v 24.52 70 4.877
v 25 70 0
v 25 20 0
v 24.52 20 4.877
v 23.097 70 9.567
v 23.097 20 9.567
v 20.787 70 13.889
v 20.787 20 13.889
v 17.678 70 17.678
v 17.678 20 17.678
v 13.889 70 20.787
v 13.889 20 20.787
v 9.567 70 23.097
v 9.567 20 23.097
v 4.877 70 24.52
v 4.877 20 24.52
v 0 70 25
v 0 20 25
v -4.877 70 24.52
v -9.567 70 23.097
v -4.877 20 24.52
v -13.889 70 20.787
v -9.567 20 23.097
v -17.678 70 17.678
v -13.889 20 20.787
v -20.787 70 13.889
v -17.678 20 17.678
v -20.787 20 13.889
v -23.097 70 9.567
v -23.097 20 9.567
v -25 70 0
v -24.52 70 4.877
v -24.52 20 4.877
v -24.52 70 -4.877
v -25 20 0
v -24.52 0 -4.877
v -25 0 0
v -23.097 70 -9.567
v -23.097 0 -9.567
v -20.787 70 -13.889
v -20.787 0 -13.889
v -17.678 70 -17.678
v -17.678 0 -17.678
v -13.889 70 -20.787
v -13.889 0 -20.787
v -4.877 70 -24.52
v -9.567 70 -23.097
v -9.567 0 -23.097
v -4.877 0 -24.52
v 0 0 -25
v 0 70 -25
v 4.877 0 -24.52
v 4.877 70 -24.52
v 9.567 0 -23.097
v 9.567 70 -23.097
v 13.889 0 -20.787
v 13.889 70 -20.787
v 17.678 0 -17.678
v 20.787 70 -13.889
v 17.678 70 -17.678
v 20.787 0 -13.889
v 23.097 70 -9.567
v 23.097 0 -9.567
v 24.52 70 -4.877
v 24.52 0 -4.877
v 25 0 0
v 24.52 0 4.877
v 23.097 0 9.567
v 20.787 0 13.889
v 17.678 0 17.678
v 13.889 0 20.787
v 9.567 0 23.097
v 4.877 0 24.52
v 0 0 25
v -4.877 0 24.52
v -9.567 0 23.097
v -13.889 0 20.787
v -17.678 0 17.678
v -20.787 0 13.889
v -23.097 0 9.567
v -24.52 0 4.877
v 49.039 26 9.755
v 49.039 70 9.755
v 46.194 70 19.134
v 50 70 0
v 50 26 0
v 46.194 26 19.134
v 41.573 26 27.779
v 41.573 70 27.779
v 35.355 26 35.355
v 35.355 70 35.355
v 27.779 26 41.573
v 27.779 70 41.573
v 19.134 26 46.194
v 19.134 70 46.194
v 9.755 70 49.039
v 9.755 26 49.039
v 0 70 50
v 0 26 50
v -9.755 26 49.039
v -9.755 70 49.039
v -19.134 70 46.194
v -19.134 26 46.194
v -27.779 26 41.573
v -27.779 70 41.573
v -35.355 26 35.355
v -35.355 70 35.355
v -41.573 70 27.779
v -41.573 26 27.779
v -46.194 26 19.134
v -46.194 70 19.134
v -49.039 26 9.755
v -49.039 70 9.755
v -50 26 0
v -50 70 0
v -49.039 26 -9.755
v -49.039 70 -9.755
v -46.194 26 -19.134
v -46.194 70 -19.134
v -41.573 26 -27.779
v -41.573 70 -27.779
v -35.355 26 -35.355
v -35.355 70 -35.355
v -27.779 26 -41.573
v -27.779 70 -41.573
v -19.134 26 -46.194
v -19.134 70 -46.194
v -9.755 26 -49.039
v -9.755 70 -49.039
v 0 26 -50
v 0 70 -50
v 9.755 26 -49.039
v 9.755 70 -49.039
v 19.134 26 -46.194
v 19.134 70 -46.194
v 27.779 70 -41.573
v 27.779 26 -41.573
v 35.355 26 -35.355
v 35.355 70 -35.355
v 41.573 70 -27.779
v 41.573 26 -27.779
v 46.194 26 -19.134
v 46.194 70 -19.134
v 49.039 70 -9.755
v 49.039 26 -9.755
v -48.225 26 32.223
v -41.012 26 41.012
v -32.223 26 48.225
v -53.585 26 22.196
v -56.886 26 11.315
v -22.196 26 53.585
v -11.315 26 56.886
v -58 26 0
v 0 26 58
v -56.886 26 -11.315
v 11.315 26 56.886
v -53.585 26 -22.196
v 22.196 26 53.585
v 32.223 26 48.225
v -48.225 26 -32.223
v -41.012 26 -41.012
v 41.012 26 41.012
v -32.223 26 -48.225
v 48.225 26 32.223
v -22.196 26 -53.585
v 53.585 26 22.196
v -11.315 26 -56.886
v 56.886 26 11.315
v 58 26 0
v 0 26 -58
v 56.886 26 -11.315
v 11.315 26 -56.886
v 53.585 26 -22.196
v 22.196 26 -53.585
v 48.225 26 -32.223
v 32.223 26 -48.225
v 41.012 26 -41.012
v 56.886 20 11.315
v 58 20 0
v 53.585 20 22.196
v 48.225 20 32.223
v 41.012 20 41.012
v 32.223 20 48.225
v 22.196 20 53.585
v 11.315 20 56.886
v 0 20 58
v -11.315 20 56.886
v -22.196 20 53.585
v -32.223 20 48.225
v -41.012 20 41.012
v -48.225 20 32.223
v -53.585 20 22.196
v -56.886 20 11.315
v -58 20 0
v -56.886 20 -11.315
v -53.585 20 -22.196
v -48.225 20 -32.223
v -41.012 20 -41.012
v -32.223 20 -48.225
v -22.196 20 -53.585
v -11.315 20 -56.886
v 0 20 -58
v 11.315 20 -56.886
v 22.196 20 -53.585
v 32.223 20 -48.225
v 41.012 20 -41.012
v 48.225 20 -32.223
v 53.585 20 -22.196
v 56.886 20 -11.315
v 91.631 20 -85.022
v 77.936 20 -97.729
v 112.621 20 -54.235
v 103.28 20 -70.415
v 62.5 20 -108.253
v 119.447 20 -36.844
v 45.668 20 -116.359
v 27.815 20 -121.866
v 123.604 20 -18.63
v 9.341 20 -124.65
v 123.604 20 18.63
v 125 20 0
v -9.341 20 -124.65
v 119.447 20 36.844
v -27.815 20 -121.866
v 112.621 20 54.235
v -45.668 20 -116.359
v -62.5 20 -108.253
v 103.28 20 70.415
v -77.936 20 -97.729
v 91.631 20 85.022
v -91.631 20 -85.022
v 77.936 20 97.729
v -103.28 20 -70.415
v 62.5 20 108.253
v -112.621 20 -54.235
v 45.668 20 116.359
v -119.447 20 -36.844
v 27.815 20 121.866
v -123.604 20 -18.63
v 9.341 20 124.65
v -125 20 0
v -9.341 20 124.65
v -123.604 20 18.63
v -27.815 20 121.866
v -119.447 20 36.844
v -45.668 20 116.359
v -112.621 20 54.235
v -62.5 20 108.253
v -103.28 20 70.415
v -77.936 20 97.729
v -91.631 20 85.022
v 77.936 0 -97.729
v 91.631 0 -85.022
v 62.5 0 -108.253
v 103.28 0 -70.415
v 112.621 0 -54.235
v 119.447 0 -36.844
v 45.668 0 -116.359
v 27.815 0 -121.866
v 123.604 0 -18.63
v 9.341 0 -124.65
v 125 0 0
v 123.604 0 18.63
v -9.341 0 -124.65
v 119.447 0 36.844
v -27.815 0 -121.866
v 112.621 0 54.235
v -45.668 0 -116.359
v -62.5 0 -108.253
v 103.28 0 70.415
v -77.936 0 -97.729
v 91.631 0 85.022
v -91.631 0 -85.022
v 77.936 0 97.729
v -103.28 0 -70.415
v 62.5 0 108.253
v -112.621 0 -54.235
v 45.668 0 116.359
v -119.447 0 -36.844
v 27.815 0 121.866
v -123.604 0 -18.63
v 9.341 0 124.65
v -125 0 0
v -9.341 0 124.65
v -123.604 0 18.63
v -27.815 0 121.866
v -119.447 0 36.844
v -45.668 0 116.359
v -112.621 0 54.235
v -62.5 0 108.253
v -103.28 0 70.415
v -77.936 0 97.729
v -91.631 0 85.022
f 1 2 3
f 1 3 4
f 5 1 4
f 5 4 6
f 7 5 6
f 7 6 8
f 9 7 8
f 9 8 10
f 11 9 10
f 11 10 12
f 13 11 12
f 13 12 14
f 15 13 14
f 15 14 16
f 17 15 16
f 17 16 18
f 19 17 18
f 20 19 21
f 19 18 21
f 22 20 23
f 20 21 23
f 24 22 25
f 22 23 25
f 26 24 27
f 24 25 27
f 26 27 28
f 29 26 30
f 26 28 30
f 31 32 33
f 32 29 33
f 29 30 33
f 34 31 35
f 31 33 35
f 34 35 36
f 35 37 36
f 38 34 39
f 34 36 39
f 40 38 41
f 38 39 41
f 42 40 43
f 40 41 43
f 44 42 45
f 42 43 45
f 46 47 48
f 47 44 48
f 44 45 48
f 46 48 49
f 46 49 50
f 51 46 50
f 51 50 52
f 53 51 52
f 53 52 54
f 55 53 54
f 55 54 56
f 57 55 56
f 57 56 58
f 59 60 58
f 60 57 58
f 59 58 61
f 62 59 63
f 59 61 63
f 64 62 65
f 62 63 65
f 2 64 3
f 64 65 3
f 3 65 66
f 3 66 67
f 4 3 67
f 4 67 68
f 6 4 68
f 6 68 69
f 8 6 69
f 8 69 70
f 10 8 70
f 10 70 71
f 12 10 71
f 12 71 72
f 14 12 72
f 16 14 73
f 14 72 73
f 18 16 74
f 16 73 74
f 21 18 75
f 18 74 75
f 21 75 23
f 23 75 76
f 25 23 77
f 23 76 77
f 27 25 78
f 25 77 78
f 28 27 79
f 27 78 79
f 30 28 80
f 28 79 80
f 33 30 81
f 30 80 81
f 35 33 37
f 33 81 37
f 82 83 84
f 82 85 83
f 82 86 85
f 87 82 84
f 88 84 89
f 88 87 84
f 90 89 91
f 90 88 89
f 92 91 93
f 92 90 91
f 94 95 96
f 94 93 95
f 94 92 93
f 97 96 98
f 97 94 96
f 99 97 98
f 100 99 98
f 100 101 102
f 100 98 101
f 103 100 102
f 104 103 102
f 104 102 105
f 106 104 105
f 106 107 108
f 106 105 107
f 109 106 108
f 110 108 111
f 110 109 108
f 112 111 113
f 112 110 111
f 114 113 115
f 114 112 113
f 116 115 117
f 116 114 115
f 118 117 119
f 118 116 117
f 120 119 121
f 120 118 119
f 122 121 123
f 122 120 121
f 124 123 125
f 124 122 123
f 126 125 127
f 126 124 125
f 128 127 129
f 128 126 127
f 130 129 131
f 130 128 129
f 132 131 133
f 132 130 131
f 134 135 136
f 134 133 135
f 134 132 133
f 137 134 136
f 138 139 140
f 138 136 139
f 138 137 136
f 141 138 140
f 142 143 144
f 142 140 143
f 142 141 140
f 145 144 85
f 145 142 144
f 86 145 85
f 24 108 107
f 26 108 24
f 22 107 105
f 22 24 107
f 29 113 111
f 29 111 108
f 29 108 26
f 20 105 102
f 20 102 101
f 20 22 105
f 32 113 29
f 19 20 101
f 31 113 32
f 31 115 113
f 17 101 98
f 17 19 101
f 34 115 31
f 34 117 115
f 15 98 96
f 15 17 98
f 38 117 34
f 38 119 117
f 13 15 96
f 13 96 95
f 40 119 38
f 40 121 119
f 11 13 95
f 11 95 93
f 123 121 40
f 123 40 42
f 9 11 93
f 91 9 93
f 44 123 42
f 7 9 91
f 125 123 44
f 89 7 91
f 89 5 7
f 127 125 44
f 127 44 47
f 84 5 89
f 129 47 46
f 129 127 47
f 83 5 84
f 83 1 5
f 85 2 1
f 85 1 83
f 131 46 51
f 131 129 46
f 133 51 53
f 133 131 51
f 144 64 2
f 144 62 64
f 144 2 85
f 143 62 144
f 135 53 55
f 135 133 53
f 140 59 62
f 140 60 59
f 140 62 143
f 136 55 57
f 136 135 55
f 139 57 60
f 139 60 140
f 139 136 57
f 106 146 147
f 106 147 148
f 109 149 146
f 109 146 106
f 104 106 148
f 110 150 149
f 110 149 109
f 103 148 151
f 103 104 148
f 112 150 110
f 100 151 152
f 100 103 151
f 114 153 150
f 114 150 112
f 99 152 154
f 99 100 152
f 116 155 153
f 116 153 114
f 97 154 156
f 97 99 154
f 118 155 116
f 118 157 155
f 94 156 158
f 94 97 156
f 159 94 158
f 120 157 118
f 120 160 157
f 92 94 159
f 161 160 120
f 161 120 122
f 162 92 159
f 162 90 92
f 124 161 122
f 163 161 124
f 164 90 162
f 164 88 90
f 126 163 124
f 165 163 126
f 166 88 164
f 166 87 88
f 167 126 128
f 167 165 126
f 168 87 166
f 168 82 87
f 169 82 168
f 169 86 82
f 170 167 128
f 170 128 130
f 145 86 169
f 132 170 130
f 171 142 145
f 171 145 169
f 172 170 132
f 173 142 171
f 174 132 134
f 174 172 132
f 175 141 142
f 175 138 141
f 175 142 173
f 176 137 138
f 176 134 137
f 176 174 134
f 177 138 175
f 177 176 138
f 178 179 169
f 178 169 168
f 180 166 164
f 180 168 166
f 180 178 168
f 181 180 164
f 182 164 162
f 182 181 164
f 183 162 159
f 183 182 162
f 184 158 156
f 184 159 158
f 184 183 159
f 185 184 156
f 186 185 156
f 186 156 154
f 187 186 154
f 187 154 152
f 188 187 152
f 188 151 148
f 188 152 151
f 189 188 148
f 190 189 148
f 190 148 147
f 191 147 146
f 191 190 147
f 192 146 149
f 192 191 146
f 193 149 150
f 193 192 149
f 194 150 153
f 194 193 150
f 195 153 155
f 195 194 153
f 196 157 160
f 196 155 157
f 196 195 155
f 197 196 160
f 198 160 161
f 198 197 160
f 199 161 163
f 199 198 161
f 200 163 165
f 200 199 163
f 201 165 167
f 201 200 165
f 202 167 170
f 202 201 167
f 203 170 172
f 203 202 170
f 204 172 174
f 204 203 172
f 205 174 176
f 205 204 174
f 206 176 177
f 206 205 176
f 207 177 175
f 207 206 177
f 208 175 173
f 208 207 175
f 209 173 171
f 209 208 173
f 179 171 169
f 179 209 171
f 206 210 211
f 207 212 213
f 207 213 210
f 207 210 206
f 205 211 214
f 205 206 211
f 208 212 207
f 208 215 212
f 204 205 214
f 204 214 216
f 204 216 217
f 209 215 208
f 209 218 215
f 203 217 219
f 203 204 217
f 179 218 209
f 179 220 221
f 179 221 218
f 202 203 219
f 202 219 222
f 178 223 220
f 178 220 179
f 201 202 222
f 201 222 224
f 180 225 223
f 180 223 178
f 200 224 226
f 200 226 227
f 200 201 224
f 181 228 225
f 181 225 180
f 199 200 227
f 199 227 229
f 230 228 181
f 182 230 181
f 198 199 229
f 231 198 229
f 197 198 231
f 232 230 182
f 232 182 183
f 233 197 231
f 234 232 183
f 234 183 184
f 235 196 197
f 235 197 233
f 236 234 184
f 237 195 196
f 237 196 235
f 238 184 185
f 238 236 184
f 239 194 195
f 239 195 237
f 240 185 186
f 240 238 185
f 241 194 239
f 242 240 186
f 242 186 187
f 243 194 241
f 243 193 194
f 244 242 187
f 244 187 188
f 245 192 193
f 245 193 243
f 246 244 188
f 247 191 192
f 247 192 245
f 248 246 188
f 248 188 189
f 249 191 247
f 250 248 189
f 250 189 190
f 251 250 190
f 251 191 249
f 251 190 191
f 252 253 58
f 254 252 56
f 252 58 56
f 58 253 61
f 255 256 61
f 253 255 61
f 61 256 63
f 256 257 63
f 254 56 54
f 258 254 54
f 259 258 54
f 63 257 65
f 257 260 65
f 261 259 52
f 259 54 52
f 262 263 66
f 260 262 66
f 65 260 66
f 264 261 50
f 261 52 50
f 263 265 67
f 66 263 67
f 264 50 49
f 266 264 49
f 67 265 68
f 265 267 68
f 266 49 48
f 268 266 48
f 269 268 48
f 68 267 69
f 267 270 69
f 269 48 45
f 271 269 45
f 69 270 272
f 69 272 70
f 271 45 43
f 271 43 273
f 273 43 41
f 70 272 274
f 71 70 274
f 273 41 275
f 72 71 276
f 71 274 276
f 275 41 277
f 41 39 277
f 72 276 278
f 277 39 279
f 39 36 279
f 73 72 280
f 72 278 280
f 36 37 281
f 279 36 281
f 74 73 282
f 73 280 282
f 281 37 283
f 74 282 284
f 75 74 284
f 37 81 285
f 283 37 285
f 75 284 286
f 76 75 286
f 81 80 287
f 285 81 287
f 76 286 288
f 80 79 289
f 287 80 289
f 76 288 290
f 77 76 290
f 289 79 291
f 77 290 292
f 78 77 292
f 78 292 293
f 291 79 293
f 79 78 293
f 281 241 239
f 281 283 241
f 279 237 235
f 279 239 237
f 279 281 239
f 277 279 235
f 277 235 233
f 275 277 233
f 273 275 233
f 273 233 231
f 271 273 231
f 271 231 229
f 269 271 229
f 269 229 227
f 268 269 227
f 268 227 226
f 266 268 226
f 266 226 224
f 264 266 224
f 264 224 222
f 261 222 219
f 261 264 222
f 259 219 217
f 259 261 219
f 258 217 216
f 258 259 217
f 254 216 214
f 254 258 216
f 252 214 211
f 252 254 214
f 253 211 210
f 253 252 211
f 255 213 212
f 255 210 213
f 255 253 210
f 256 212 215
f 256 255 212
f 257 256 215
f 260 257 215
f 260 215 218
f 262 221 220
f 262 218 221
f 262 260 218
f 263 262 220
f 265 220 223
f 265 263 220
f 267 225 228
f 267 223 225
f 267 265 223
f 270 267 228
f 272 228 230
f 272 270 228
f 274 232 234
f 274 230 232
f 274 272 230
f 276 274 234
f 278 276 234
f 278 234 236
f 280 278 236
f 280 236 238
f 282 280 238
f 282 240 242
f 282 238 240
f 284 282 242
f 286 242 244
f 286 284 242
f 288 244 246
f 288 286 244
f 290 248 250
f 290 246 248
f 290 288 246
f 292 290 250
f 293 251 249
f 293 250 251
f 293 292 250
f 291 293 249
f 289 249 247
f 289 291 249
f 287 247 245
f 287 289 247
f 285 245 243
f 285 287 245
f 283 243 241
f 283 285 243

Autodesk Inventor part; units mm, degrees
ref_plane "YZ Plane" through (0, 0, 0) normal (1, 0, 0) x (0, 1, 0)
ref_plane "XZ Plane" through (0, 0, 0) normal (0, 1, 0) x (-1, 0, 0)
ref_plane "XY Plane" through (0, 0, 0) normal (0, 0, 1) x (1, 0, 0)
sketch "Sketch1" plane through (0, 0, 0) normal (0, 1, 0) x (-1, 0, 0)
  circle A0 centre (0, 0) radius 125
  circle A1 centre (0, 0) radius 25
  dimension "d0" = 250
  dimension "d3" = 50
extrude "Extrusion1" add sketch "Sketch1" along normal blind 20
sketch "Sketch2" plane through (0, 20, 0) normal (0, 1, 0) x (1, 0, 0)
  circle A0 centre (0, 0) radius 25 construction
  circle A1 centre (0, 0) radius 25
  circle A2 centre (0, 0) radius 50
  dimension "d10" = 100
extrude "Extrusion2" add sketch "Sketch2" along normal blind 50
sketch "Sketch3" plane through (0, 20, 0) normal (0, 1, 0) x (1, 0, 0)
  circle A0 centre (0, 0) radius 50 construction
  circle A1 centre (0, 0) radius 125 construction
  circle A2 centre (0, 0) radius 58
  circle A3 centre (0, 0) radius 50 construction
  circle A4 centre (0, 0) radius 50
  dimension "d6" = 8
  dimension "d7" = 116
extrude "Extrusion3" add sketch "Sketch3" along normal blind 6
properties part number "ShaibaNaPatron"
